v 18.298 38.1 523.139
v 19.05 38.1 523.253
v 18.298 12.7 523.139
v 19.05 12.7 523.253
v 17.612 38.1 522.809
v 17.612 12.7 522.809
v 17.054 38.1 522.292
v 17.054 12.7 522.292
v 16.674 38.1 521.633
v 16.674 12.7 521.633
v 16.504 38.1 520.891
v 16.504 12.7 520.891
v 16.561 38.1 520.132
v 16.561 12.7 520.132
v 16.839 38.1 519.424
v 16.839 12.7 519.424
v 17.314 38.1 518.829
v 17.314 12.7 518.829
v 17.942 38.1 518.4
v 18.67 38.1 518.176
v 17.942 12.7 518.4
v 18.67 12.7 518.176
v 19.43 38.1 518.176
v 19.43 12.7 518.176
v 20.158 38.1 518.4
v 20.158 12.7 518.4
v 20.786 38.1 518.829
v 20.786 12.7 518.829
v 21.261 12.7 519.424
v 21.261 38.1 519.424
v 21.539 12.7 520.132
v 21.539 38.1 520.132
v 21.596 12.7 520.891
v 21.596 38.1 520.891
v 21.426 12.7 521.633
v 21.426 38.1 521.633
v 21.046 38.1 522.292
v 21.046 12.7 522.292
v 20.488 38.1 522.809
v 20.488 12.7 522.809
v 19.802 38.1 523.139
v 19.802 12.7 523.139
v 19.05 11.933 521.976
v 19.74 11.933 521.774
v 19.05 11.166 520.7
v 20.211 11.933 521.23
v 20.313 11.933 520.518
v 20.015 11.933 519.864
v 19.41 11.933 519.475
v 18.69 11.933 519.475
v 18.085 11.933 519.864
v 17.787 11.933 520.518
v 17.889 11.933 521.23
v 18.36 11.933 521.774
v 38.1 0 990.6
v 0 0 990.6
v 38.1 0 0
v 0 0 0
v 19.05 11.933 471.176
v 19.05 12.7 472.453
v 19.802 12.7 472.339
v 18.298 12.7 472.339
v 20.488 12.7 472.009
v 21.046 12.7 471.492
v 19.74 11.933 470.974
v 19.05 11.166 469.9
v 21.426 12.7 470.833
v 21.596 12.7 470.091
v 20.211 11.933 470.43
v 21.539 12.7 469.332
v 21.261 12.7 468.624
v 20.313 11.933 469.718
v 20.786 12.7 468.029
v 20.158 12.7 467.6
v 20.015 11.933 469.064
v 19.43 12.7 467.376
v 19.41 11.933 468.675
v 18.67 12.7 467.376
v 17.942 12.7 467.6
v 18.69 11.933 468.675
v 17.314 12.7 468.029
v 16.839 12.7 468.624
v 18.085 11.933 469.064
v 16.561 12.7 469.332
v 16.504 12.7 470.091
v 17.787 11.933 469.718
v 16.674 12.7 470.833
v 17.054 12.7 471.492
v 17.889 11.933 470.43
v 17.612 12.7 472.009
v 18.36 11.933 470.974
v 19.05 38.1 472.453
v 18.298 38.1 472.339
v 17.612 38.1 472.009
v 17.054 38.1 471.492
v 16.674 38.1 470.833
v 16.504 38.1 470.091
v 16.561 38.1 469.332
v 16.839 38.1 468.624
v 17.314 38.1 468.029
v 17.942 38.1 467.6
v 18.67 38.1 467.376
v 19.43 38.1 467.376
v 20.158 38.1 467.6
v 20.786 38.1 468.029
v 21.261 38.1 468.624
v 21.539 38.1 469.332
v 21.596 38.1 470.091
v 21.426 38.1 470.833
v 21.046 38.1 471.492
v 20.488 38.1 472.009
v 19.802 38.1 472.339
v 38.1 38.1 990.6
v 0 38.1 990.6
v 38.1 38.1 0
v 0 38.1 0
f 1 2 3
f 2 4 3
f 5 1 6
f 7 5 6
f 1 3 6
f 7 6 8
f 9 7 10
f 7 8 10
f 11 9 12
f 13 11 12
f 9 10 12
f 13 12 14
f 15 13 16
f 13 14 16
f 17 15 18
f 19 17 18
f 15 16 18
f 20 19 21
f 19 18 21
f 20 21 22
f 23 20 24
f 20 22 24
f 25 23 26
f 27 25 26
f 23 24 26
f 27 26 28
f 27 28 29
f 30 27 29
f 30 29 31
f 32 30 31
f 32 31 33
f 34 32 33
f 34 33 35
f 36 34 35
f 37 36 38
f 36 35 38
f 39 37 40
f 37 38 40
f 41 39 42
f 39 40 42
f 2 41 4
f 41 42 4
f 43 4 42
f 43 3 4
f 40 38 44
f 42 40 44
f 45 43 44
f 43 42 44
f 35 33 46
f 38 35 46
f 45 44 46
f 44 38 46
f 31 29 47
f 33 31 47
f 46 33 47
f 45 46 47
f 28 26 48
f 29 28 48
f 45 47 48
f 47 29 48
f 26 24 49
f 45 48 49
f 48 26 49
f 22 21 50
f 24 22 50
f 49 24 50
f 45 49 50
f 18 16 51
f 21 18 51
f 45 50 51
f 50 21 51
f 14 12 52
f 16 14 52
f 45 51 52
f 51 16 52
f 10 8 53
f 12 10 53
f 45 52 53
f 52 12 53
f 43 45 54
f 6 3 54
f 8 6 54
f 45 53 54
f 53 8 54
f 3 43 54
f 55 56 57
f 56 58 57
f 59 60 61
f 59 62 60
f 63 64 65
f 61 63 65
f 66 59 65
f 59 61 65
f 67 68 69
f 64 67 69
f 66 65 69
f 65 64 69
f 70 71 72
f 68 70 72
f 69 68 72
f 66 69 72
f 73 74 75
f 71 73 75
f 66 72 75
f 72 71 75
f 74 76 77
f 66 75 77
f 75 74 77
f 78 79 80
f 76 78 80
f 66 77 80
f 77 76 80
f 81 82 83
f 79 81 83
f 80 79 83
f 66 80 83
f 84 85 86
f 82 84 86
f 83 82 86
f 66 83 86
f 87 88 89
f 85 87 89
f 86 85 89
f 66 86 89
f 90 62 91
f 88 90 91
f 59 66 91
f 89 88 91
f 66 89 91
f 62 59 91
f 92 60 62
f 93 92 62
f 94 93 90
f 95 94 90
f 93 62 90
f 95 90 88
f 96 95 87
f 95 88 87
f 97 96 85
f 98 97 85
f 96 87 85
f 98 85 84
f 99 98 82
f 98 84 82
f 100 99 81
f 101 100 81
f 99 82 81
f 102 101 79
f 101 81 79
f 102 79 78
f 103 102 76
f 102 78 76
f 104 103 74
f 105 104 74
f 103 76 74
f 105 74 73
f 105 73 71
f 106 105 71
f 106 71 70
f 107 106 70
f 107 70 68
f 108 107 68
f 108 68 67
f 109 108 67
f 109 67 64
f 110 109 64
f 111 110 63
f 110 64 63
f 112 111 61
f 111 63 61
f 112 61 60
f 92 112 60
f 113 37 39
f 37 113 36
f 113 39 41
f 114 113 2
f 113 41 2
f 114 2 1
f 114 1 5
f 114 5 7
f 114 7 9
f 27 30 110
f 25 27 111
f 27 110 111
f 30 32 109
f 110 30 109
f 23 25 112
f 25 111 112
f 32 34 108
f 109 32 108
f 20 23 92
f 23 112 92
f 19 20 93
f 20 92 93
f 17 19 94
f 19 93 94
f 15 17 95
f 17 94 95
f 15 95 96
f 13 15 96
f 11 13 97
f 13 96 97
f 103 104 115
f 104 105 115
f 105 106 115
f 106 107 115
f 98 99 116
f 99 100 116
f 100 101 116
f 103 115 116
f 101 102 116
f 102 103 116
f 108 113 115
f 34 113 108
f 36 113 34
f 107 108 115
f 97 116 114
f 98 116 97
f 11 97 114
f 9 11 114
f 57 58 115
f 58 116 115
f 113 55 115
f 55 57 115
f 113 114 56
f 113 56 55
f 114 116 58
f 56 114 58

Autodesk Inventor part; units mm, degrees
ref_plane "YZ Plane" through (0, 0, 0) normal (1, 0, 0) x (0, 1, 0)
ref_plane "XZ Plane" through (0, 0, 0) normal (0, 1, 0) x (-1, 0, 0)
ref_plane "XY Plane" through (0, 0, 0) normal (0, 0, 1) x (1, 0, 0)
sketch "Sketch1" plane through (0, 0, 0) normal (0, 0, 1) x (1, 0, 0)
  line L0 (0, 0) -> (38.1, 0)
  line L1 (38.1, 0) -> (38.1, 38.1)
  line L2 (38.1, 38.1) -> (0, 38.1)
  line L3 (0, 38.1) -> (0, 0)
  dimension "d0" = 38.1
  dimension "d1" = 38.1
extrude "Extrusion1" add sketch "Sketch1" along normal blind 990.6
sketch "Sketch3" plane through (0, 38.1, 0) normal (0, 1, 0) x (1, 0, 0)
  line L0 (0, 0) -> (0, -990.6) projected
  line L1 (38.1, 0) -> (38.1, -990.6) projected
  line L2 (0, -495.3) -> (38.1, -495.3) construction
  circle A0 centre (19.05, -469.9) radius 4.1388
  circle A1 centre (19.05, -520.7) radius 4.1388
  dimension "d21" = 25.4
hole "Hole2" at (19.05, 38.1, 469.9) at (19.05, 38.1, 520.7) direction (0, -1, 0) diameter 5.1054 depth 25.4 tip angle 118 clearance for "Flat Head Machine Screw (82)" size "#10" standard "Ansi Unified Screw Threads"
sketch "Sketch4" plane through (38.1, 0, 0) normal (1, 0, 0) x (0, 0, -1)
  line L0 (0, 0) -> (0, 38.1) projected
  line L1 (0, 38.1) -> (-990.6, 38.1) projected
  line L2 (-990.6, 0) -> (-990.6, 38.1) projected
  line L3 (0, 0) -> (-990.6, 0) projected
  line L4 (-495.3, 38.1) -> (-495.3, 0) construction
properties part number "hubjig_side1" material "Wood (Cherry)"
